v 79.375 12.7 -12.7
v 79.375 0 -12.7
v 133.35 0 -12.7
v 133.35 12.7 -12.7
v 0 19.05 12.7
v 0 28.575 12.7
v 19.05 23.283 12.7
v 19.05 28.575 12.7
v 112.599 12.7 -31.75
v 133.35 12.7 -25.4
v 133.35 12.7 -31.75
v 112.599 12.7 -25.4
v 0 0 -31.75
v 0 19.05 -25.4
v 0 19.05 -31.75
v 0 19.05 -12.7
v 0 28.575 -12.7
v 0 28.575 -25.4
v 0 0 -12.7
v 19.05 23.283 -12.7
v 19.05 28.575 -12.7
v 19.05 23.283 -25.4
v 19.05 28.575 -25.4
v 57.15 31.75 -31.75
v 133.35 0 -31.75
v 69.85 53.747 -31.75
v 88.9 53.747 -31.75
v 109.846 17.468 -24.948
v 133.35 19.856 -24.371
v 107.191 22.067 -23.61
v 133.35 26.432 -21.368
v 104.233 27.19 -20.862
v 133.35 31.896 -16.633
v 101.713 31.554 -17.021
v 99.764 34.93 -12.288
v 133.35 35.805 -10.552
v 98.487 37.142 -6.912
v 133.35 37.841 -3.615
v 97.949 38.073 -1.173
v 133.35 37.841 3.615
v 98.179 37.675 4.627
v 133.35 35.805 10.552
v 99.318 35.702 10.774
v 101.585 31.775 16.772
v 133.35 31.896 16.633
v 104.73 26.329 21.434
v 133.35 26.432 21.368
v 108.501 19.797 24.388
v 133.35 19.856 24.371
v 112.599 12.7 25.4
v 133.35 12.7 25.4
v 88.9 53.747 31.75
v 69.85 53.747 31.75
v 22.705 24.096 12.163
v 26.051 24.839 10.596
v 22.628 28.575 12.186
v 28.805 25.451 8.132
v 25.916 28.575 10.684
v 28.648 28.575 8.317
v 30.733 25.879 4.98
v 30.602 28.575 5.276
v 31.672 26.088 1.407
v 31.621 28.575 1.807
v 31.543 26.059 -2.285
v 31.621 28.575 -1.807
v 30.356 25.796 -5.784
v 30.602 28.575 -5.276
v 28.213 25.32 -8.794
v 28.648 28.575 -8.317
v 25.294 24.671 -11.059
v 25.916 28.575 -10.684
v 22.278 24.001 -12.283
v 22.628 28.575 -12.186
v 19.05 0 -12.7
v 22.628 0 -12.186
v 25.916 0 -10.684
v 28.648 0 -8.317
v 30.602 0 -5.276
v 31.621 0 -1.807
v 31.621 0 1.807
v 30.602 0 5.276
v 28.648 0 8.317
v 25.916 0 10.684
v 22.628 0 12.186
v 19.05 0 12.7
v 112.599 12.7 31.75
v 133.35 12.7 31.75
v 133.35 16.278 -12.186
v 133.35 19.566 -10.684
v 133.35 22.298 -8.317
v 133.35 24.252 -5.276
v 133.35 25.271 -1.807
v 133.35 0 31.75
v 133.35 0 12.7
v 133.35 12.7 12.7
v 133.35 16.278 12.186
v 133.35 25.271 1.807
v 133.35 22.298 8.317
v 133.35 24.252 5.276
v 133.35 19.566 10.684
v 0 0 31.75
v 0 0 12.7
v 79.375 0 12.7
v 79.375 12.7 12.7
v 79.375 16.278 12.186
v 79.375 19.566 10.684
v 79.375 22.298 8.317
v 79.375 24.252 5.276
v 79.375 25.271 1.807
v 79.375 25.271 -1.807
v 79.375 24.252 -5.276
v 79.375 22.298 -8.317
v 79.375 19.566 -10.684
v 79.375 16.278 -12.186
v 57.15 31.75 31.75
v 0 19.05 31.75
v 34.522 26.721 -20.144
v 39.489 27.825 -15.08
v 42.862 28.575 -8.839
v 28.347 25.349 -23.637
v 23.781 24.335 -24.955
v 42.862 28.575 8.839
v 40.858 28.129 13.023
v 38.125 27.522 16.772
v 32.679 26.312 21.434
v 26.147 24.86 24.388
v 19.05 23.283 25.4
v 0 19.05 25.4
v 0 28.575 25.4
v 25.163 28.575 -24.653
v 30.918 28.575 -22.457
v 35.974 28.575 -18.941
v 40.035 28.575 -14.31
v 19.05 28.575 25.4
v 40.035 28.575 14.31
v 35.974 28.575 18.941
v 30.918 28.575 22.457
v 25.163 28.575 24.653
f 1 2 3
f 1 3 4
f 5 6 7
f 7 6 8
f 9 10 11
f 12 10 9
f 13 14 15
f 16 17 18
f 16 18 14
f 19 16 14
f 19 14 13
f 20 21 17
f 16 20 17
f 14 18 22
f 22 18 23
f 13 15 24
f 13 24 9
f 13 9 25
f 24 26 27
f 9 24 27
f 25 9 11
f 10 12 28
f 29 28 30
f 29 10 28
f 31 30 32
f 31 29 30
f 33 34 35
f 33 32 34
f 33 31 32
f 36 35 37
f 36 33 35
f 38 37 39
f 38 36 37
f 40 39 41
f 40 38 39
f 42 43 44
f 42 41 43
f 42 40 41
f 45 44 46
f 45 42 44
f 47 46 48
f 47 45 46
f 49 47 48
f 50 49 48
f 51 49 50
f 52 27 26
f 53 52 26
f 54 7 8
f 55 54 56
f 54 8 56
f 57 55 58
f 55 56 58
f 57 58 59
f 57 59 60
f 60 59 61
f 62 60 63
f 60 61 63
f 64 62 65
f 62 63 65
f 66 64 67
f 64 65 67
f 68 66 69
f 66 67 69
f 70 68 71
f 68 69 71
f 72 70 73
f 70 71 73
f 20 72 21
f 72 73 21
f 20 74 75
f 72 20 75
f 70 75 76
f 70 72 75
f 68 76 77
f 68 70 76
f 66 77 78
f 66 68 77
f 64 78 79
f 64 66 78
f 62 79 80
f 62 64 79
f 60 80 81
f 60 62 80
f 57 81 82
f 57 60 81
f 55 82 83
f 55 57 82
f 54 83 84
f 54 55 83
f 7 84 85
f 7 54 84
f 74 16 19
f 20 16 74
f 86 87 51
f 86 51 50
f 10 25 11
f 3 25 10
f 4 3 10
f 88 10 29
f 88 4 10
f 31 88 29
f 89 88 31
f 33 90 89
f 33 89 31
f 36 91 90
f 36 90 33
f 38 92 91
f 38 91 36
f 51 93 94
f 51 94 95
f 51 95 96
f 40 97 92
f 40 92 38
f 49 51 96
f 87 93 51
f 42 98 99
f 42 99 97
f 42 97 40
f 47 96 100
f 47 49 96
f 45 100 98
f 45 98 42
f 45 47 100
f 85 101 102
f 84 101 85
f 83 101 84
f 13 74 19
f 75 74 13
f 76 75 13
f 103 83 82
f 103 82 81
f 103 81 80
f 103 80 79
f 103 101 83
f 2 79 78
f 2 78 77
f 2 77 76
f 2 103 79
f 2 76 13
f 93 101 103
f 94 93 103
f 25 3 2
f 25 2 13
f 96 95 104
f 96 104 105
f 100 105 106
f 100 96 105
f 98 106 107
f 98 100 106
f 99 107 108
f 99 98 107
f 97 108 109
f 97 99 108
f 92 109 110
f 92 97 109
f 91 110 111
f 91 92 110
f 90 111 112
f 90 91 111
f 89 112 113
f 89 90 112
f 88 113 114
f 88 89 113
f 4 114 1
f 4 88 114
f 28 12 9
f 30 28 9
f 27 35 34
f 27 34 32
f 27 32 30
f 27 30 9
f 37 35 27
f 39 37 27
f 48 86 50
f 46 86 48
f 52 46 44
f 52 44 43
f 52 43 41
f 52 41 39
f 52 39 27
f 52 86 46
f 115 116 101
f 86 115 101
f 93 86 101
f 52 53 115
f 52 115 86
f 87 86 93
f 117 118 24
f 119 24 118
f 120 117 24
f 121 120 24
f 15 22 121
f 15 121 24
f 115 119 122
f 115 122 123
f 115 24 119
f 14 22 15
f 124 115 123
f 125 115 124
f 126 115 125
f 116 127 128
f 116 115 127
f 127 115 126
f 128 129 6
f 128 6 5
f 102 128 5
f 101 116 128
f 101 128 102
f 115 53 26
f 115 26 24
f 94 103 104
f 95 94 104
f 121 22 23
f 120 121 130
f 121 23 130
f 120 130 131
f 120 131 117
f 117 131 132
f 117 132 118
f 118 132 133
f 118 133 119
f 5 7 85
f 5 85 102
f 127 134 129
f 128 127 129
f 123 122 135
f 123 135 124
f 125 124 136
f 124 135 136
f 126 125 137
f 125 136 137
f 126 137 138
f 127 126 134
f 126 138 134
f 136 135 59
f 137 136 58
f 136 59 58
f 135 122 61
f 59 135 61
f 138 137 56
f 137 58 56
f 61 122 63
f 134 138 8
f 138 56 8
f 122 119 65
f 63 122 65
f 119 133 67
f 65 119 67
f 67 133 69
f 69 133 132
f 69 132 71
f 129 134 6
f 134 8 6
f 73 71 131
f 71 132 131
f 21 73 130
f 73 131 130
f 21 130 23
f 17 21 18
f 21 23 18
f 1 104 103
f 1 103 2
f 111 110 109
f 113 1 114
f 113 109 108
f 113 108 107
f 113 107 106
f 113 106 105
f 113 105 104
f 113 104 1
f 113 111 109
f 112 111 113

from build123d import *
from build123d.topology import SkipClean

# Parameters (mm, degrees)
BOSS_EXTRUDE1_DEPTH = 31.75
BOSS_EXTRUDE2_REACH = 149.238
SKETCH2_W           = 12.7
SKETCH2_H           = 12.7
SKETCH2_3_W         = 12.7
SKETCH2_3_H         = 12.7
CUT_EXTRUDE1_DEPTH  = 53.975
BOSS_EXTRUDE4_REACH = 142.024
CUT_EXTRUDE2_DEPTH  = 141.024339402


with BuildPart() as part:
    # Sketch1 → Boss-Extrude1 (new, symmetric)
    with BuildSketch(Plane.XY):
        Polygon((0, 0), (133.35, 0), (133.35, 12.7), (112.598522628, 12.7), (88.9, 53.747045256), (69.85, 53.747045256), (57.15, 31.75), (0, 19.05), align=None)
    extrude(amount=BOSS_EXTRUDE1_DEPTH, both=True)

    # Boss-Extrude2: up to this plane
    boss_extrude2_end = Plane(origin=(88.9, 53.747045256, 31.75), z_dir=(-0.8660254037844364, -0.5000000000000041, 0))
    # Sketch2 → Boss-Extrude2 (add, up to the surface)
    with BuildSketch(Plane(origin=(133.35, 0, 0), x_dir=(0, 0, -1), z_dir=(1, 0, 0)), mode=Mode.PRIVATE) as boss_extrude2_sk1:
        with BuildLine():
            ThreePointArc((25.4, 12.7), (0, 38.1), (-25.4, 12.7))
            Line((-25.4, 12.7), (-12.7, 12.7))
            ThreePointArc((-12.7, 12.7), (0, 25.4), (12.7, 12.7))
            Line((12.7, 12.7), (25.4, 12.7))
        make_face()
    boss_extrude2_tool1 = split(extrude(boss_extrude2_sk1.sketch, amount=-BOSS_EXTRUDE2_REACH, mode=Mode.PRIVATE), bisect_by=boss_extrude2_end, keep=Keep.BOTH, mode=Mode.PRIVATE)
    add(boss_extrude2_tool1.solids().sort_by_distance((133.35, 13.267961, 19.05))[0])
    # Sketch2 → Boss-Extrude2 (add, up to the surface)
    with BuildSketch(Plane(origin=(133.35, 0, 0), x_dir=(0, 0, -1), z_dir=(1, 0, 0)), mode=Mode.PRIVATE) as boss_extrude2_sk2:
        with Locations((-19.05, 6.35)):
            Rectangle(SKETCH2_W, SKETCH2_H)
    boss_extrude2_tool2 = split(extrude(boss_extrude2_sk2.sketch, amount=-BOSS_EXTRUDE2_REACH, mode=Mode.PRIVATE), bisect_by=boss_extrude2_end, keep=Keep.BOTH, mode=Mode.PRIVATE)
    add(boss_extrude2_tool2.solids().sort_by_distance((133.35, 6.35, 19.05))[0])
    # Sketch2 → Boss-Extrude2 (add, up to the surface)
    with BuildSketch(Plane(origin=(133.35, 0, 0), x_dir=(0, 0, -1), z_dir=(1, 0, 0)), mode=Mode.PRIVATE) as boss_extrude2_sk3:
        with Locations((19.05, 6.35)):
            Rectangle(SKETCH2_W, SKETCH2_H)
    boss_extrude2_tool3 = split(extrude(boss_extrude2_sk3.sketch, amount=-BOSS_EXTRUDE2_REACH, mode=Mode.PRIVATE), bisect_by=boss_extrude2_end, keep=Keep.BOTH, mode=Mode.PRIVATE)
    add(boss_extrude2_tool3.solids().sort_by_distance((133.35, 6.35, -19.05))[0])

    # Sketch2<3> → Cut-Extrude1 (cut)
    with BuildSketch(Plane(origin=(133.35, 0, 0), x_dir=(0, 0, -1), z_dir=(1, 0, 0))):
        with Locations((-6.35, 6.35)):
            Rectangle(SKETCH2_3_W, SKETCH2_3_H)
        with Locations((6.35, 6.35)):
            Rectangle(SKETCH2_3_W, SKETCH2_3_H)
        with BuildLine():
            Line((-12.7, 12.7), (0, 12.7))
            Line((0, 12.7), (12.7, 12.7))
            ThreePointArc((12.7, 12.7), (0, 25.4), (-12.7, 12.7))
        make_face()
    extrude(amount=-CUT_EXTRUDE1_DEPTH, mode=Mode.SUBTRACT)

    # Boss-Extrude4: up to this face of the body (flat: up to its plane)
    boss_extrude4_end = Plane(part.part.faces().sort_by_distance((28.575, 25.4, 0))[0])
    # Sketch4 → Boss-Extrude4 (add, up to the picked face)
    with BuildSketch(Plane(origin=(0, 28.575, 0), x_dir=(-1, 0, 0), z_dir=(0, -1, 0)), mode=Mode.PRIVATE) as boss_extrude4_sk1:
        with BuildLine():
            ThreePointArc((-19.05, -12.7), (-31.75, 0), (-19.05, 12.7))
            Line((-19.05, 12.7), (0, 12.7))
            Line((0, 12.7), (0, 25.4))
            Line((0, 25.4), (-19.05, 25.4))
            ThreePointArc((-19.05, 25.4), (-44.45, 0), (-19.05, -25.4))
            Line((-19.05, -25.4), (0, -25.4))
            Line((0, -25.4), (0, -12.7))
            Line((0, -12.7), (-19.05, -12.7))
        make_face()
    boss_extrude4_tool1 = split(extrude(boss_extrude4_sk1.sketch, amount=BOSS_EXTRUDE4_REACH, mode=Mode.PRIVATE), bisect_by=boss_extrude4_end, keep=Keep.BOTH, mode=Mode.PRIVATE)
    add(boss_extrude4_tool1.solids().sort_by(Axis((32.425014, 28.575, 0), (0, -1, 0)))[0])

    # Sketch4<3> → Cut-Extrude2 (cut, through all)
    with SkipClean():  # the faces are left unmerged after this step: merging them gives an invalid solid
        with BuildSketch(Plane(origin=(0, 28.575, 0), x_dir=(-1, 0, 0), z_dir=(0, -1, 0))):
            with BuildLine():
                Line((0, -12.7), (0, 12.7))
                Line((0, 12.7), (-19.05, 12.7))
                ThreePointArc((-19.05, 12.7), (-31.75, 0), (-19.05, -12.7))
                Line((-19.05, -12.7), (0, -12.7))
            make_face()
        extrude(amount=CUT_EXTRUDE2_DEPTH, mode=Mode.SUBTRACT)


solid = part.part
